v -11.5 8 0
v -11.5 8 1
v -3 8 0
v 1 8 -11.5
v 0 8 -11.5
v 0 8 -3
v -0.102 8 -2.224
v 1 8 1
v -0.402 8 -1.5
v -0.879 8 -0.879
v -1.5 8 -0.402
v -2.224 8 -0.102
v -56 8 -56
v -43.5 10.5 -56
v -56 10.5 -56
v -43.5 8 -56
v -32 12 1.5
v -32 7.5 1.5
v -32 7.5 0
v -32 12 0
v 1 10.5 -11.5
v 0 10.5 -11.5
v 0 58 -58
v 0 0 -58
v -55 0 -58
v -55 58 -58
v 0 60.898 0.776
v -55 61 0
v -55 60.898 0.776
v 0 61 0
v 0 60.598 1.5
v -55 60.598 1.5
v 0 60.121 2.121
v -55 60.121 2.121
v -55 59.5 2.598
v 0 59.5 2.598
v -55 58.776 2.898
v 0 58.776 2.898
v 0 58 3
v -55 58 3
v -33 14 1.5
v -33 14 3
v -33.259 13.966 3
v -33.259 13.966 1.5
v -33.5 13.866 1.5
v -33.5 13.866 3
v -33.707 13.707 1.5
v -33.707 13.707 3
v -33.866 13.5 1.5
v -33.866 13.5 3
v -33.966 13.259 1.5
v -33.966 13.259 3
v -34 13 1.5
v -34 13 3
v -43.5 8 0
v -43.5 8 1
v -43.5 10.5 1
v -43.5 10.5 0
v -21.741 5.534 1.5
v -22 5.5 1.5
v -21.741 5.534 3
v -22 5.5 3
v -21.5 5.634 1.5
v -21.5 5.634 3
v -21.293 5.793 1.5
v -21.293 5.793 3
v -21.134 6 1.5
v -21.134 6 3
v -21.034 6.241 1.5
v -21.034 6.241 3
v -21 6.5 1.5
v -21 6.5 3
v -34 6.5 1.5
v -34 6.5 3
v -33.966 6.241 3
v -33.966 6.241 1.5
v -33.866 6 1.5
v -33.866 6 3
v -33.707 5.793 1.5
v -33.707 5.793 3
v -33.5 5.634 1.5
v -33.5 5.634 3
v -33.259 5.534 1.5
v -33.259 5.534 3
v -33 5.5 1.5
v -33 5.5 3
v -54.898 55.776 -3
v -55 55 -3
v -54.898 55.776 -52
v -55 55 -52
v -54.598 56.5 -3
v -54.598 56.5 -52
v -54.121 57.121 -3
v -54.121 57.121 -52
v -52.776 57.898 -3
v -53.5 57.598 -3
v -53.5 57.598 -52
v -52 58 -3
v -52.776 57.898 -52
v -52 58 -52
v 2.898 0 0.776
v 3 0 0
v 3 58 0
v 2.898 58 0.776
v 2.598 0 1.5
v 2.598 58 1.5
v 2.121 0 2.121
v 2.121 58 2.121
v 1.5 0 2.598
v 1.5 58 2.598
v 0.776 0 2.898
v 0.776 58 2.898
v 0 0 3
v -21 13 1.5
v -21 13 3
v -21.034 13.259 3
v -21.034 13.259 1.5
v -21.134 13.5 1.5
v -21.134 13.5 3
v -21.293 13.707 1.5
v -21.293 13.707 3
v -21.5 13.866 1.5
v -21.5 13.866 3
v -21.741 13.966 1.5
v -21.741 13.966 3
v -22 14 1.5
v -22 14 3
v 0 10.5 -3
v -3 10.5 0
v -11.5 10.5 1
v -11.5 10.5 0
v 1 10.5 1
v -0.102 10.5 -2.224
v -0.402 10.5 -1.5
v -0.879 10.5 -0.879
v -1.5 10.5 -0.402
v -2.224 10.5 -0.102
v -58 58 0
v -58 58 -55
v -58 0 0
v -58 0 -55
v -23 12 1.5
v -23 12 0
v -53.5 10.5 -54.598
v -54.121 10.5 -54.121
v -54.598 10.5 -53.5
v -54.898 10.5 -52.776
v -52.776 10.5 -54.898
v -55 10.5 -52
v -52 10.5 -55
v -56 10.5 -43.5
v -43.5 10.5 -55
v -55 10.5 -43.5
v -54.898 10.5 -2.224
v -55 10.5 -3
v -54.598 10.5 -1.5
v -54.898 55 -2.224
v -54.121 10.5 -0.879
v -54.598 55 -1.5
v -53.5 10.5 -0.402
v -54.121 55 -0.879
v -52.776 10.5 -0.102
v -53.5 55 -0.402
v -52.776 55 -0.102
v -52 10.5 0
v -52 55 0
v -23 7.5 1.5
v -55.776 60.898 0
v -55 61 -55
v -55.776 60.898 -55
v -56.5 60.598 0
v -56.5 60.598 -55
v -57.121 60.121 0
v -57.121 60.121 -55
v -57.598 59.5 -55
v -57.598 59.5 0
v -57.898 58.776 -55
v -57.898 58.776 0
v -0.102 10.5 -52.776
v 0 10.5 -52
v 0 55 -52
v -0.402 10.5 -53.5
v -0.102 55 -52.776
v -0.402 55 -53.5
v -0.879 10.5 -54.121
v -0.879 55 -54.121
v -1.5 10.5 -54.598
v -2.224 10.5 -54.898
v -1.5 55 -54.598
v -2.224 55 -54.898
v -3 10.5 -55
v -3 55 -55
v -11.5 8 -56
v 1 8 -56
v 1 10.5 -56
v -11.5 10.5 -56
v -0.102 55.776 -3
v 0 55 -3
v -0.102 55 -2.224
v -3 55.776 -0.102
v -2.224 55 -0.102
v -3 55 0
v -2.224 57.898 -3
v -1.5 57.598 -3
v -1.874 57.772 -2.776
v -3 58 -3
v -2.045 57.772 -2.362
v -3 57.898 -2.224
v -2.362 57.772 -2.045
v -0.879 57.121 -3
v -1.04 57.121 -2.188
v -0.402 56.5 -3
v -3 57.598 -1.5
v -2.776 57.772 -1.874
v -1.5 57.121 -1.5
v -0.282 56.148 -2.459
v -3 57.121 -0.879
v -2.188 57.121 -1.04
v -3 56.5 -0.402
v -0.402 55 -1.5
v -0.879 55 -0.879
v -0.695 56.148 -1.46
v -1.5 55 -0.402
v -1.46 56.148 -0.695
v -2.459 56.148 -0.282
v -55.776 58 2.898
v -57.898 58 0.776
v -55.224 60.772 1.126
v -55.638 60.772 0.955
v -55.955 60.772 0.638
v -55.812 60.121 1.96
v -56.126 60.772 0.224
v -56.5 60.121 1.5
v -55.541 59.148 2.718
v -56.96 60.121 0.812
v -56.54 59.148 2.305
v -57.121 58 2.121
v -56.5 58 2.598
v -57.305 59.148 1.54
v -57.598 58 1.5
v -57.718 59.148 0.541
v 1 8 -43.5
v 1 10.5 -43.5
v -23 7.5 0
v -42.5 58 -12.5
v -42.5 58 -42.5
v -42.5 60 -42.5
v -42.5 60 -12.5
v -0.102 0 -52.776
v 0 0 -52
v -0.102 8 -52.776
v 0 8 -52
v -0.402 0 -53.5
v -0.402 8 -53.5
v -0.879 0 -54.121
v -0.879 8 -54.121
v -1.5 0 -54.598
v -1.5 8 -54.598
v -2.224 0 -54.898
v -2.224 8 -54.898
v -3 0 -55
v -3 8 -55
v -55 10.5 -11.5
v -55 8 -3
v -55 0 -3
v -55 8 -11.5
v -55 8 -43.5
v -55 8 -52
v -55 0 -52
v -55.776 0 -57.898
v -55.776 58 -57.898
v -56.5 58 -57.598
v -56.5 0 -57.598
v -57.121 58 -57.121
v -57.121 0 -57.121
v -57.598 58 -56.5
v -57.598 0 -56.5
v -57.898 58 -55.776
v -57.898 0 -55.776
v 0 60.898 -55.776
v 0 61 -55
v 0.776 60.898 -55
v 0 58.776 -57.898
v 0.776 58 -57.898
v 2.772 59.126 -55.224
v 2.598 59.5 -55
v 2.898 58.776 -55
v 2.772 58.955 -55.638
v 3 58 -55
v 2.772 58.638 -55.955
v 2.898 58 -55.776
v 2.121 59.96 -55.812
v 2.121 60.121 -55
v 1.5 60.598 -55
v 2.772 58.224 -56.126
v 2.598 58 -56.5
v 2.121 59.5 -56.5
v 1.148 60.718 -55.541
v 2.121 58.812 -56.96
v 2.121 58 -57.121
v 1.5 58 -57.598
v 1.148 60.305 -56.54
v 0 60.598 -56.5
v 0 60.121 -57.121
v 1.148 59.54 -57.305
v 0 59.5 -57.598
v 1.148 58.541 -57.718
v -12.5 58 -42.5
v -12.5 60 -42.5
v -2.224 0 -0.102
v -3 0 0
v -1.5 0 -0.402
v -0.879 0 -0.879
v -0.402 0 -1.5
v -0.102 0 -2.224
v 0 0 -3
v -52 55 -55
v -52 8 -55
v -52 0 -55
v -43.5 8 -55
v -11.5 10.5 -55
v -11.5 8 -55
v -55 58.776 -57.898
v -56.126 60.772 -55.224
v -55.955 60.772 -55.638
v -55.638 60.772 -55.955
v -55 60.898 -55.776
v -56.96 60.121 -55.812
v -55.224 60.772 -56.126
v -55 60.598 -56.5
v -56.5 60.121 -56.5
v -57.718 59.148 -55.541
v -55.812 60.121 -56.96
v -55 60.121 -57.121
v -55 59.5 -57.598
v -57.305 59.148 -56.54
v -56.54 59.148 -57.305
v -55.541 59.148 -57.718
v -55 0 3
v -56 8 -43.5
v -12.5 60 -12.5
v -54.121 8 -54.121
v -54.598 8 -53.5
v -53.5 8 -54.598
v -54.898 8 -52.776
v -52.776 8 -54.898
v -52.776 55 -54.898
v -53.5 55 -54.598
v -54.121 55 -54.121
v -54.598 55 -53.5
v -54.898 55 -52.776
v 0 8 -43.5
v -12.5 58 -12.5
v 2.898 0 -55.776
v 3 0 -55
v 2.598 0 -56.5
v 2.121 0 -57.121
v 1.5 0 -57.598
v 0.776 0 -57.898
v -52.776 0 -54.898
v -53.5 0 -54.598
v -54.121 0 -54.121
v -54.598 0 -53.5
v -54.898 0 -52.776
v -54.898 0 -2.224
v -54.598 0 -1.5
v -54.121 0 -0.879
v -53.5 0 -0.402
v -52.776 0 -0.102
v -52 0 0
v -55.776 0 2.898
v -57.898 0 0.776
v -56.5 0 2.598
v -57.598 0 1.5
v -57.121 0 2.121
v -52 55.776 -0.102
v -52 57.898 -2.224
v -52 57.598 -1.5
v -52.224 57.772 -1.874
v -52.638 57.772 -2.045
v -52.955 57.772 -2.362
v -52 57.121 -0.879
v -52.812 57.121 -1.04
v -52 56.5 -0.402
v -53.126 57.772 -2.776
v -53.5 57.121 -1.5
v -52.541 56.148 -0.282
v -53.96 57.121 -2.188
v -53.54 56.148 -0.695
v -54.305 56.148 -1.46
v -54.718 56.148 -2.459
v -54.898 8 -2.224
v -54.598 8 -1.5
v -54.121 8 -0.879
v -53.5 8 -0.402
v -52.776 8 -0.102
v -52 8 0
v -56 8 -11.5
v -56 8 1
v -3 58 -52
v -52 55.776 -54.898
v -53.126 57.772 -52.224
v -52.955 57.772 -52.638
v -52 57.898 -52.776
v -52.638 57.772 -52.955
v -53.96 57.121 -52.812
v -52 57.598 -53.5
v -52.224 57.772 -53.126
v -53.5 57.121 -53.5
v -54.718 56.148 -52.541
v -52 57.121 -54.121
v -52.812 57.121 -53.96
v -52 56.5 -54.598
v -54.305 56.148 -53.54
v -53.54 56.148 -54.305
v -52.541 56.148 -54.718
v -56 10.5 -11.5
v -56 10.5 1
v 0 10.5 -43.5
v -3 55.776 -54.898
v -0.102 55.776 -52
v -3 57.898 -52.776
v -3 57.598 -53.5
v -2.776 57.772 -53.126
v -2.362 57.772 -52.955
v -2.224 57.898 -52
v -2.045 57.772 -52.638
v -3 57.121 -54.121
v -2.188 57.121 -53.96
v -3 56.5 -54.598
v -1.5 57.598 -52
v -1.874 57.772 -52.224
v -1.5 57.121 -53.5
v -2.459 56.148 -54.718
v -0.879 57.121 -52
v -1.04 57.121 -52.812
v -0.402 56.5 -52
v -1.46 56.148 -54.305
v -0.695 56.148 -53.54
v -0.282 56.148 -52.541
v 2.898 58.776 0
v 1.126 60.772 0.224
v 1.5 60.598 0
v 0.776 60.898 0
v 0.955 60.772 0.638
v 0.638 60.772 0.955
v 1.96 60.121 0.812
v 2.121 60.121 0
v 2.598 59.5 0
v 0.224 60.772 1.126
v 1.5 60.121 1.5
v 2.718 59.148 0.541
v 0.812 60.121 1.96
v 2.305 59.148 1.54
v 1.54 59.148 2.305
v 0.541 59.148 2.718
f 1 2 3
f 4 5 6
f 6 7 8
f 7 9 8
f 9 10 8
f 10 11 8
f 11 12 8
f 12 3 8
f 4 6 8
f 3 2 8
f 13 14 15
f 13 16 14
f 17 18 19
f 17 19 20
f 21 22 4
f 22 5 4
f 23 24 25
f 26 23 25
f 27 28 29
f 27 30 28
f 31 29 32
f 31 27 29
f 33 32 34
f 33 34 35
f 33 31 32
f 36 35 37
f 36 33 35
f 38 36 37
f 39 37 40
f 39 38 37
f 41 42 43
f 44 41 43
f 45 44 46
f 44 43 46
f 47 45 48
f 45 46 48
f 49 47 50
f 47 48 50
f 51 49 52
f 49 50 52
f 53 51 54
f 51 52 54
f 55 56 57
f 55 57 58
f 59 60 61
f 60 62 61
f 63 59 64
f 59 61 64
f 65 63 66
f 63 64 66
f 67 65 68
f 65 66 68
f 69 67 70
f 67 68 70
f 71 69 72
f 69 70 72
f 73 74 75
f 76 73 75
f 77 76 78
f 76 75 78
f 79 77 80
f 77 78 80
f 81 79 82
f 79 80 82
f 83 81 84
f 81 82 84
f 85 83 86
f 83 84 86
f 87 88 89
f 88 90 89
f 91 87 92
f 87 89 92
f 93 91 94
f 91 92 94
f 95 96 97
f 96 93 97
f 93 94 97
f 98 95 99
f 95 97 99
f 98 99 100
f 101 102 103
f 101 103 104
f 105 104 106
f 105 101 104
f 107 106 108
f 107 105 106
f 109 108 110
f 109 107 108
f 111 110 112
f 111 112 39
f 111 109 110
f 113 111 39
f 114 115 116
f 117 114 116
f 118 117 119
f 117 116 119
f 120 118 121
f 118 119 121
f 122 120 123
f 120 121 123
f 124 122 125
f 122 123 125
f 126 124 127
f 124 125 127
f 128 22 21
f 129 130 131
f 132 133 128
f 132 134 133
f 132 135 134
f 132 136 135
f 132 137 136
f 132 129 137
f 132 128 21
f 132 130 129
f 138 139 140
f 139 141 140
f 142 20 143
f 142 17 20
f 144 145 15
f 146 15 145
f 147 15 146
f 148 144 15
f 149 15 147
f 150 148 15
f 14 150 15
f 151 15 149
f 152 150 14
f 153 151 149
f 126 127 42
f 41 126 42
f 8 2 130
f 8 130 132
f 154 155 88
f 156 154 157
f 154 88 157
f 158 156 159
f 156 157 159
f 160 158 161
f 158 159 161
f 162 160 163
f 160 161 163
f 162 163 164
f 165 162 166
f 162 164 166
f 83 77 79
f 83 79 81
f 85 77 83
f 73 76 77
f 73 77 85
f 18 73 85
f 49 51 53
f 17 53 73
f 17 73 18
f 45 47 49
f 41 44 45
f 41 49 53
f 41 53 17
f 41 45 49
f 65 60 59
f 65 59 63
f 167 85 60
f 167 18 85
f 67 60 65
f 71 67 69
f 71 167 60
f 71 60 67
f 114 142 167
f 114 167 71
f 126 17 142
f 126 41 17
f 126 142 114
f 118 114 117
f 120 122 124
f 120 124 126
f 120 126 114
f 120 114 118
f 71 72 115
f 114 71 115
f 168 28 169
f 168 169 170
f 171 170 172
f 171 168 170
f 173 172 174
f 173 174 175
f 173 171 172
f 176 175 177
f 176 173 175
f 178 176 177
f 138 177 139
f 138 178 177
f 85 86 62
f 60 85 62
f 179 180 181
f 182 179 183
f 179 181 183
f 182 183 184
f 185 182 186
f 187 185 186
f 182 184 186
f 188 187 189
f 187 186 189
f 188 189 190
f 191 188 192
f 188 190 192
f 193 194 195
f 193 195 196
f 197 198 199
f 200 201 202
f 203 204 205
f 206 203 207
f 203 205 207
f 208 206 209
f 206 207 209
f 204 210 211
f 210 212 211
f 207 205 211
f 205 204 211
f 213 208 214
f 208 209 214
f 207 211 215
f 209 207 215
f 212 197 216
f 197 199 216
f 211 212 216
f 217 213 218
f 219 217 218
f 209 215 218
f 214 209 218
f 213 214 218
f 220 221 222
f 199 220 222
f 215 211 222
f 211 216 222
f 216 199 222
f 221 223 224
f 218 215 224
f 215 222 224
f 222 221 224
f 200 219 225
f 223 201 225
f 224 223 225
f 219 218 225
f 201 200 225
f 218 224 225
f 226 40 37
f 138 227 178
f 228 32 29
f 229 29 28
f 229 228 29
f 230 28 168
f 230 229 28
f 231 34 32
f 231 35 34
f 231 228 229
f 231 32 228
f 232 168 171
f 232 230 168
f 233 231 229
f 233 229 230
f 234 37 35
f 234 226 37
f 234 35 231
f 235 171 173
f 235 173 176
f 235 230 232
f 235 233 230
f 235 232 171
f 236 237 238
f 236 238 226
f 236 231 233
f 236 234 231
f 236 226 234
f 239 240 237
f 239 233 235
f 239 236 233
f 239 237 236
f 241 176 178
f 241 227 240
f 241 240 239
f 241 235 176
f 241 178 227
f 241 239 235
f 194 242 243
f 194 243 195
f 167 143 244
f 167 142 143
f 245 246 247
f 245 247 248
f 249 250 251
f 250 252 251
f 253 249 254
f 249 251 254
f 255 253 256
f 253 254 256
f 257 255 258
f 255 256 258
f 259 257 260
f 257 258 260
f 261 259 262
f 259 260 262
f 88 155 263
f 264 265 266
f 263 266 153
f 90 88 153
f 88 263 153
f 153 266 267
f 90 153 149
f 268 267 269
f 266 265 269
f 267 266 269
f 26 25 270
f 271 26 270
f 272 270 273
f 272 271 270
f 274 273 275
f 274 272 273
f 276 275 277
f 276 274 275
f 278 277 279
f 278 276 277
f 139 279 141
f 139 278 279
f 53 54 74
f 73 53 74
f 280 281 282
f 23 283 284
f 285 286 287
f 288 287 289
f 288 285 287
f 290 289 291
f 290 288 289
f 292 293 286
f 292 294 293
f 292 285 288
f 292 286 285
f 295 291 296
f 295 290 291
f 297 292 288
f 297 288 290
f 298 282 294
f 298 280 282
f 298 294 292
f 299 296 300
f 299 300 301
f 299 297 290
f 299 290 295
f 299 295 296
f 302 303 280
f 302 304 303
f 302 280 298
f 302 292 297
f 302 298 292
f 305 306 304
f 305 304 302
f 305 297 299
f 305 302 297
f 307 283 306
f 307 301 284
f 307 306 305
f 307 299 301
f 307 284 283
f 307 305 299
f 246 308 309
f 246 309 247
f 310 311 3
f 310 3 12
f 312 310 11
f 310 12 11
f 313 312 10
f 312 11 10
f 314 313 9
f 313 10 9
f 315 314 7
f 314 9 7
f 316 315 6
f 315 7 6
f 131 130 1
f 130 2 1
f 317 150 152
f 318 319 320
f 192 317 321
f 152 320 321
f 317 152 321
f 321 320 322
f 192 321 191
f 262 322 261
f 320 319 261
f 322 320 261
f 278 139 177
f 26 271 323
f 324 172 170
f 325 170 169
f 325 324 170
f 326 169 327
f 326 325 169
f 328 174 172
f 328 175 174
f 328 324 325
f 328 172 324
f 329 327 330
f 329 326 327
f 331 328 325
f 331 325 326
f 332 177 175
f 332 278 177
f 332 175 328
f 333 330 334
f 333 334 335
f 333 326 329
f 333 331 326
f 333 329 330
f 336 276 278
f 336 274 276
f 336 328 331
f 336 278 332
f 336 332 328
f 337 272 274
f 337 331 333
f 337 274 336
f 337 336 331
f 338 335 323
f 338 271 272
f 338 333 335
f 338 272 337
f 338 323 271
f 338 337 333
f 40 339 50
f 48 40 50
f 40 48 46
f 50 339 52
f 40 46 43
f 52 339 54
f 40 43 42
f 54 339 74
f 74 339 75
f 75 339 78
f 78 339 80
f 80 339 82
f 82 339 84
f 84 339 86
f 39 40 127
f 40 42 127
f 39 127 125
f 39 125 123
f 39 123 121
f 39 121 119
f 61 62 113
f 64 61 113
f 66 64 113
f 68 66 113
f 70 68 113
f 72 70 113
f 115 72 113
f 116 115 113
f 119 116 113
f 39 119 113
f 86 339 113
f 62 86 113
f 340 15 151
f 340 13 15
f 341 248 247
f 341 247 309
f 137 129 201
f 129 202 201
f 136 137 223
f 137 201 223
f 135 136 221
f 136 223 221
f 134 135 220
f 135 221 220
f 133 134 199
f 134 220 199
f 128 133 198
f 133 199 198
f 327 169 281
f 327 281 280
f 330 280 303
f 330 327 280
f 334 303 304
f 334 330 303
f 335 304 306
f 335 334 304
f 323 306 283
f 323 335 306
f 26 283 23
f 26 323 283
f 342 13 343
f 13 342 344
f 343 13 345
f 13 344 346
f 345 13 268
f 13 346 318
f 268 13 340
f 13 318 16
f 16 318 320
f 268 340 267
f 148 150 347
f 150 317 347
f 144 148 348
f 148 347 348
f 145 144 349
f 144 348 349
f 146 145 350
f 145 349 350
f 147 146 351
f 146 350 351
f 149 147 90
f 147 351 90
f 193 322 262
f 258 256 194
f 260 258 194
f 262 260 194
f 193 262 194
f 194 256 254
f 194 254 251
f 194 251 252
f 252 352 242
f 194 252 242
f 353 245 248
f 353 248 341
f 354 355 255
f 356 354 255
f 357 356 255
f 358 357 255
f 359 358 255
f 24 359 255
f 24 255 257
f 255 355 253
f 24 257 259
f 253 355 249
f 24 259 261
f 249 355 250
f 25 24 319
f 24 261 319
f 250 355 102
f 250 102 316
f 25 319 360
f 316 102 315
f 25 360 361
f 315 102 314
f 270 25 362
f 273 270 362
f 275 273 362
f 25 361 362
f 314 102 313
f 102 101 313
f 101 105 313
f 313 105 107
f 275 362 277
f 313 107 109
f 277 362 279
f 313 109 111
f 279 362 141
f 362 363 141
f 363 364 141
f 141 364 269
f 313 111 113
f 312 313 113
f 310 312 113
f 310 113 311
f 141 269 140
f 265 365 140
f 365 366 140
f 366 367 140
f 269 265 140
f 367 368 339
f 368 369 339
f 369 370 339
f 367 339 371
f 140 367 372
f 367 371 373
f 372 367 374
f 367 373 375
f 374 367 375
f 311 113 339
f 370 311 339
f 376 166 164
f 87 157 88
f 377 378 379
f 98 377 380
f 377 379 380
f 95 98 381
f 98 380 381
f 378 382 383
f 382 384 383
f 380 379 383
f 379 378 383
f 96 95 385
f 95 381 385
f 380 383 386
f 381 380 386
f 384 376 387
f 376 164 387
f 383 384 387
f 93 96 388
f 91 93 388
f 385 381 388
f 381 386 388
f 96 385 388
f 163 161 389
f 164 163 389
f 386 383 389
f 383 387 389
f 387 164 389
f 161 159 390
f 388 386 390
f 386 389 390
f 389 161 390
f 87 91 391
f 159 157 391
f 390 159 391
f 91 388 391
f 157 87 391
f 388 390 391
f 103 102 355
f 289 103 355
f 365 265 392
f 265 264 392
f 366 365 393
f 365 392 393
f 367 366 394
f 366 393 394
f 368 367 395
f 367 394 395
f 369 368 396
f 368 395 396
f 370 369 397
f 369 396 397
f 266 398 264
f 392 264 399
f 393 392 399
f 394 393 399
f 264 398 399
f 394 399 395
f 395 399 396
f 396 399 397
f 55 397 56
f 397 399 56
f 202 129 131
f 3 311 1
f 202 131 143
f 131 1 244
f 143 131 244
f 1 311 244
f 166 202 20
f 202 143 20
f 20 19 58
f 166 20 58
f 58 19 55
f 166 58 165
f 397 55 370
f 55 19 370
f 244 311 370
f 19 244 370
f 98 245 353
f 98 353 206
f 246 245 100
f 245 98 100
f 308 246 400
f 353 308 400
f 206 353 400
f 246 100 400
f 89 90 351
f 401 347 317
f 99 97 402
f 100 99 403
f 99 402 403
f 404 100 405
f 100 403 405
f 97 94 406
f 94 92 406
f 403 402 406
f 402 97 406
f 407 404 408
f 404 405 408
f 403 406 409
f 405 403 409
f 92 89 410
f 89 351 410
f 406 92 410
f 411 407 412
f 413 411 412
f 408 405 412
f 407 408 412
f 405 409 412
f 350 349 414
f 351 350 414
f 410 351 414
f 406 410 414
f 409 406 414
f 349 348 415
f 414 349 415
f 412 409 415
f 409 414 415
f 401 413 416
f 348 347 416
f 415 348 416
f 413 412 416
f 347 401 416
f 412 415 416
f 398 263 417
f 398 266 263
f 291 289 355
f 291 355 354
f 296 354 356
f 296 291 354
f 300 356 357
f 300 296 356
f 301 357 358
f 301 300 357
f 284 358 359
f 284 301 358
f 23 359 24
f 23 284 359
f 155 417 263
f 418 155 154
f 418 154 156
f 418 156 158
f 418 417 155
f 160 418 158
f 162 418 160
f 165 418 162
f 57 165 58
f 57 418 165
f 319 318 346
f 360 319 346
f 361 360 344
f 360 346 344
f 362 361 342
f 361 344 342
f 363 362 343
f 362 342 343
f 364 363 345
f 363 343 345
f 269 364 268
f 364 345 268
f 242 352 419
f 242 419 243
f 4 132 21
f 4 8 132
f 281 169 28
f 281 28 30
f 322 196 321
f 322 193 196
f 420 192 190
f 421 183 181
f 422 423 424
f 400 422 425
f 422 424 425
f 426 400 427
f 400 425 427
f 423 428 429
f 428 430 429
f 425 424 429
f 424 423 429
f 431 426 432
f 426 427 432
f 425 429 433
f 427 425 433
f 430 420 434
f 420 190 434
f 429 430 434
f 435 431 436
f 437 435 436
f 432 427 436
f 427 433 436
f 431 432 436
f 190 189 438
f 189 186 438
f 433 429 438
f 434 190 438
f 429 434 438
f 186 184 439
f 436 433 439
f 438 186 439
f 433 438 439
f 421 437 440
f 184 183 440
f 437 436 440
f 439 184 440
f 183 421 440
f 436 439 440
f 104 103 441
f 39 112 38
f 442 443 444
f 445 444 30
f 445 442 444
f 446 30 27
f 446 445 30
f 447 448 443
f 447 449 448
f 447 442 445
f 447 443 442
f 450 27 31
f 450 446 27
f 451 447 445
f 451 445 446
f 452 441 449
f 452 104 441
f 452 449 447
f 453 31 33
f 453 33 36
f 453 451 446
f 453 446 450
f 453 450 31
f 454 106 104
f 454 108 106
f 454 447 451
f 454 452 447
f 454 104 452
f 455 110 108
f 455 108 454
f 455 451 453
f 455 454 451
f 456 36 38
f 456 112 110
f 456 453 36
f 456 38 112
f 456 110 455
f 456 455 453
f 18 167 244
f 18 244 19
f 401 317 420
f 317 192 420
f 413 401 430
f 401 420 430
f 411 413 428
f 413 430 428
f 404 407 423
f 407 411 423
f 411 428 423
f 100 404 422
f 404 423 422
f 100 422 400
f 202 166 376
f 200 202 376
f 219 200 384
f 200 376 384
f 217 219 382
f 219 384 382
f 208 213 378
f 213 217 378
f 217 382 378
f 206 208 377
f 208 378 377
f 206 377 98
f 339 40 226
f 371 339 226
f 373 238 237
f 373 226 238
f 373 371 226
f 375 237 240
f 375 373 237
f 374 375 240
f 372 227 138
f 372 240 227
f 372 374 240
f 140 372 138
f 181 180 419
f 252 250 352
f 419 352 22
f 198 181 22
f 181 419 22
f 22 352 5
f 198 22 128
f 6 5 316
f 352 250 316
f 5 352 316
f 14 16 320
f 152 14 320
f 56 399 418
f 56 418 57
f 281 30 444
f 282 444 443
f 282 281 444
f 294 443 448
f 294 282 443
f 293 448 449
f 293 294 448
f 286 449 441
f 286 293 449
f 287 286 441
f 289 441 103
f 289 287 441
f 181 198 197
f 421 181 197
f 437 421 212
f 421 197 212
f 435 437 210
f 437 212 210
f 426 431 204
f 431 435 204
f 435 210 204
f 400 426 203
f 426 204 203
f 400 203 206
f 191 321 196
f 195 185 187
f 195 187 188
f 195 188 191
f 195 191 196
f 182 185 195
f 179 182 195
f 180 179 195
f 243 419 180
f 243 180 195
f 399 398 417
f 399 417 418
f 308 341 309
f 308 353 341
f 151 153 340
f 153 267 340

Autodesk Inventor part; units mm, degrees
ref_plane "YZ Plane" through (0, 0, 0) normal (1, 0, 0) x (0, 1, 0)
ref_plane "XZ Plane" through (0, 0, 0) normal (0, 1, 0) x (-1, 0, 0)
ref_plane "XY Plane" through (0, 0, 0) normal (0, 0, 1) x (1, 0, 0)
sketch "Эскиз1" plane through (0, 0, 0) normal (0, 1, 0) x (-1, 0, 0)
  line L0 (0, 0) -> (55, 0)
  line L1 (55, 0) -> (55, -55)
  line L2 (55, -55) -> (0, -55)
  line L3 (0, -55) -> (0, 0)
  line L4 (-3, -58) -> (58, -58)
  line L5 (58, -58) -> (58, 3)
  line L6 (58, 3) -> (-3, 3)
  line L7 (-3, 3) -> (-3, -58)
  dimension "d0" = 55
  dimension "d1" = 55
  dimension "d2" = 3
extrude "Выдавливание1" add sketch "Эскиз1" along normal blind 58
sketch "Эскиз2" plane through (0, 58, 0) normal (0, 1, 0) x (1, 0, 0)
  line L0 (-58, -3) -> (3, -3) projected
  line L1 (3, 58) -> (-58, 58) projected
  line L2 (-58, -3) -> (3, -3)
  line L3 (3, -3) -> (3, 58)
  line L4 (3, 58) -> (-58, 58)
  line L5 (-58, 58) -> (-58, -3)
  point P0 (0, 0)
  point P1 (3, -3)
extrude "Выдавливание2" add sketch "Эскиз2" along normal blind 3
sketch "Эскиз3" plane through (0, 58, 0) normal (0, -1, 0) x (1, 0, 0)
  line L0 (3, -58) -> (-58, -58) projected
  line L1 (-58, 3) -> (3, 3) projected
  line L2 (-58, -58) -> (-58, 3) projected
  line L3 (3, 3) -> (3, -58) projected
  line L4 (-42.5, -12.5) -> (-12.5, -12.5)
  line L5 (-12.5, -12.5) -> (-12.5, -42.5)
  line L6 (-12.5, -42.5) -> (-42.5, -42.5)
  line L7 (-42.5, -42.5) -> (-42.5, -12.5)
  line L8 (-42.5, -27.5) -> (-12.5, -27.5) construction
  line L9 (-27.5, -42.5) -> (-27.5, -27.5) construction
  line L10 (-55, 0) -> (-55, -55) projected
  line L11 (-55, -27.5) -> (0, -27.5) construction
  line L12 (0, -55) -> (0, 0) projected
  line L13 (-55, -55) -> (0, -55) projected
  line L14 (-27.5, -55) -> (-27.5, -27.5) construction
  dimension "d7" = 30
  dimension "d8" = 30
extrude "Выдавливание3" cut sketch "Эскиз3" against normal blind 2 contours L4 L5 L6 L7
ref_plane "РабПлоскость1" through (0, 8, 0) normal (0, -1, 0) x (1, 0, 0)
sketch "Эскиз4" plane through (0, 8, 0) normal (0, -1, 0) x (1, 0, 0)
  line L0 (0, -55) -> (0, 0)
  line L1 (-55, -27.5) -> (0, -27.5)
  line L2 (-27.5, -55) -> (-27.5, 0)
  line L3 (-55, 0) -> (-55, -55) projected
  line L4 (3, -58) -> (-58, -58) projected
  line L5 (3, 3) -> (3, -58) projected
  line L6 (-58, -58) -> (3, -58)
  line L7 (3, -58) -> (3, 3)
  line L8 (3, 3) -> (-58, 3)
  line L9 (-58, 3) -> (-58, -58)
  line L10 (-56, 1) -> (1, 1)
  line L11 (1, 1) -> (1, -56)
  line L12 (1, -56) -> (-56, -56)
  line L13 (-56, -56) -> (-56, 1)
  line L14 (-56, -56) -> (-43.5, -56)
  line L15 (-43.5, -56) -> (-43.5, -43.5)
  line L16 (-43.5, -43.5) -> (-56, -43.5)
  line L17 (-56, -43.5) -> (-56, -56)
  line L18 (-56, 1) -> (-43.5, 1)
  line L19 (-43.5, 1) -> (-43.5, -11.5)
  line L20 (-43.5, -11.5) -> (-56, -11.5)
  line L21 (-56, -11.5) -> (-56, 1)
  line L22 (1, -56) -> (-11.5, -56)
  line L23 (-11.5, -56) -> (-11.5, -43.5)
  line L24 (-11.5, -43.5) -> (1, -43.5)
  line L25 (1, -43.5) -> (1, -56)
  line L26 (-11.5, 1) -> (-11.5, -11.5)
  line L27 (1, 1) -> (-11.5, 1)
  line L28 (-11.5, -11.5) -> (1, -11.5)
  line L29 (1, -11.5) -> (1, 1)
  point P0 (-11.5, 1)
  point P1 (1, -11.5)
  point P2 (1, -43.5)
  point P3 (-11.5, -56)
  point P4 (-56, -11.5)
  point P5 (-43.5, 1)
  point P6 (-56, -43.5)
  point P7 (-43.5, -56)
  dimension "d14" = 2
  dimension "d15" = 12.5
  dimension "d16" = 12.5
extrude "Выдавливание4" cut sketch "Эскиз4" against normal blind 2.5 contours L24 L11 L12 L23 | L28 L26 L10 L11 | L12 L13 L16 L15 | L20 L13 L10 L19
fillet "Сопряжение1" radius 3 16 edges at (-55, 34.25, 0) (0, 34.25, 0) (0, 34.25, -55) (-55, 34.25, -55) (3, 30.5, 3) (-58, 30.5, 3) (-58, 30.5, -58) (-58, 61, -27.5) (-27.5, 61, -58) (3, 61, -27.5) (3, 30.5, -58) (-27.5, 61, 3) (-27.5, 58, -55) (-55, 58, -27.5) (-27.5, 58, 0) (0, 58, -27.5)
fillet "Сопряжение2" radius 3 4 edges at (0, 4, -55) (-55, 4, -55) (-55, 4, 0) (0, 4, 0)
sketch "Эскиз5" plane through (-55, 0, 3) normal (0, 0, 1) x (1, 0, 0)
  line L0 (55, 8) -> (55, 10.5) projected
  line L1 (0, 8) -> (0, 10.5) projected
  line L2 (55, 8) -> (0, 8)
  line L3 (27.5, 8) -> (27.5, 13.4815) construction
  line L4 (27.5, 8) -> (27.5, 7.5) construction
  line L5 (23, 12) -> (32, 12)
  line L6 (32, 12) -> (32, 7.5)
  line L7 (32, 7.5) -> (23, 7.5)
  line L8 (23, 7.5) -> (23, 12)
  point P0 (55, 0)
  point P1 (27.5, 12)
  dimension "d27" = 0.5
  dimension "d28" = 9
  dimension "d29" = 4.5
extrude "Выдавливание5" cut sketch "Эскиз5" against normal blind 3
sketch "Эскиз8" plane through (-55, 0, 3) normal (0, 0, 1) x (1, 0, 0)
  line L0 (32, 12) -> (32, 7.5) projected
  line L1 (23, 12) -> (32, 12) projected
  line L2 (32, 7.5) -> (23, 7.5)
  line L3 (23, 7.5) -> (23, 12)
  line L4 (23, 12) -> (32, 12)
  line L5 (32, 12) -> (32, 7.5)
  line L6 (22, 5.5) -> (33, 5.5)
  line L7 (34, 6.5) -> (34, 13)
  line L8 (33, 14) -> (22, 14)
  line L9 (21, 13) -> (21, 6.5)
  arc A0 (33, 5.5) -> (34, 6.5) centre (33, 6.5) ccw
  arc A1 (34, 13) -> (33, 14) centre (33, 13) ccw
  arc A2 (22, 14) -> (21, 13) centre (22, 13) ccw
  arc A3 (21, 6.5) -> (22, 5.5) centre (22, 6.5) ccw
  point P0 (55, 0)
  dimension "d40" = 2
  dimension "d41" = 1
extrude "Выдавливание6" cut sketch "Эскиз8" against normal blind 1.5
sketch "Эскиз9" plane through (0, 0, -58) normal (0, 0, -1) x (-1, 0, 0)
  line L0 (3.8898, 30.331) -> (51.1102, 30.331) construction
  line L1 (51.1102, 30.331) -> (51.1102, 16.9712) construction
  line L2 (51.1102, 16.9712) -> (3.8898, 16.9712) construction
  line L3 (3.8898, 16.9712) -> (3.8898, 30.331) construction
  line L4 (12.5, 58) -> (42.5, 58) projected
  line L5 (27.5, 58) -> (27.5, 0) construction
  line L6 (0, 0) -> (55, 0) projected
  point P0 (27.5, 30.331)
equation "\"d8\" = d7"
equation "\"d16\" = d15"
properties part number "box"
